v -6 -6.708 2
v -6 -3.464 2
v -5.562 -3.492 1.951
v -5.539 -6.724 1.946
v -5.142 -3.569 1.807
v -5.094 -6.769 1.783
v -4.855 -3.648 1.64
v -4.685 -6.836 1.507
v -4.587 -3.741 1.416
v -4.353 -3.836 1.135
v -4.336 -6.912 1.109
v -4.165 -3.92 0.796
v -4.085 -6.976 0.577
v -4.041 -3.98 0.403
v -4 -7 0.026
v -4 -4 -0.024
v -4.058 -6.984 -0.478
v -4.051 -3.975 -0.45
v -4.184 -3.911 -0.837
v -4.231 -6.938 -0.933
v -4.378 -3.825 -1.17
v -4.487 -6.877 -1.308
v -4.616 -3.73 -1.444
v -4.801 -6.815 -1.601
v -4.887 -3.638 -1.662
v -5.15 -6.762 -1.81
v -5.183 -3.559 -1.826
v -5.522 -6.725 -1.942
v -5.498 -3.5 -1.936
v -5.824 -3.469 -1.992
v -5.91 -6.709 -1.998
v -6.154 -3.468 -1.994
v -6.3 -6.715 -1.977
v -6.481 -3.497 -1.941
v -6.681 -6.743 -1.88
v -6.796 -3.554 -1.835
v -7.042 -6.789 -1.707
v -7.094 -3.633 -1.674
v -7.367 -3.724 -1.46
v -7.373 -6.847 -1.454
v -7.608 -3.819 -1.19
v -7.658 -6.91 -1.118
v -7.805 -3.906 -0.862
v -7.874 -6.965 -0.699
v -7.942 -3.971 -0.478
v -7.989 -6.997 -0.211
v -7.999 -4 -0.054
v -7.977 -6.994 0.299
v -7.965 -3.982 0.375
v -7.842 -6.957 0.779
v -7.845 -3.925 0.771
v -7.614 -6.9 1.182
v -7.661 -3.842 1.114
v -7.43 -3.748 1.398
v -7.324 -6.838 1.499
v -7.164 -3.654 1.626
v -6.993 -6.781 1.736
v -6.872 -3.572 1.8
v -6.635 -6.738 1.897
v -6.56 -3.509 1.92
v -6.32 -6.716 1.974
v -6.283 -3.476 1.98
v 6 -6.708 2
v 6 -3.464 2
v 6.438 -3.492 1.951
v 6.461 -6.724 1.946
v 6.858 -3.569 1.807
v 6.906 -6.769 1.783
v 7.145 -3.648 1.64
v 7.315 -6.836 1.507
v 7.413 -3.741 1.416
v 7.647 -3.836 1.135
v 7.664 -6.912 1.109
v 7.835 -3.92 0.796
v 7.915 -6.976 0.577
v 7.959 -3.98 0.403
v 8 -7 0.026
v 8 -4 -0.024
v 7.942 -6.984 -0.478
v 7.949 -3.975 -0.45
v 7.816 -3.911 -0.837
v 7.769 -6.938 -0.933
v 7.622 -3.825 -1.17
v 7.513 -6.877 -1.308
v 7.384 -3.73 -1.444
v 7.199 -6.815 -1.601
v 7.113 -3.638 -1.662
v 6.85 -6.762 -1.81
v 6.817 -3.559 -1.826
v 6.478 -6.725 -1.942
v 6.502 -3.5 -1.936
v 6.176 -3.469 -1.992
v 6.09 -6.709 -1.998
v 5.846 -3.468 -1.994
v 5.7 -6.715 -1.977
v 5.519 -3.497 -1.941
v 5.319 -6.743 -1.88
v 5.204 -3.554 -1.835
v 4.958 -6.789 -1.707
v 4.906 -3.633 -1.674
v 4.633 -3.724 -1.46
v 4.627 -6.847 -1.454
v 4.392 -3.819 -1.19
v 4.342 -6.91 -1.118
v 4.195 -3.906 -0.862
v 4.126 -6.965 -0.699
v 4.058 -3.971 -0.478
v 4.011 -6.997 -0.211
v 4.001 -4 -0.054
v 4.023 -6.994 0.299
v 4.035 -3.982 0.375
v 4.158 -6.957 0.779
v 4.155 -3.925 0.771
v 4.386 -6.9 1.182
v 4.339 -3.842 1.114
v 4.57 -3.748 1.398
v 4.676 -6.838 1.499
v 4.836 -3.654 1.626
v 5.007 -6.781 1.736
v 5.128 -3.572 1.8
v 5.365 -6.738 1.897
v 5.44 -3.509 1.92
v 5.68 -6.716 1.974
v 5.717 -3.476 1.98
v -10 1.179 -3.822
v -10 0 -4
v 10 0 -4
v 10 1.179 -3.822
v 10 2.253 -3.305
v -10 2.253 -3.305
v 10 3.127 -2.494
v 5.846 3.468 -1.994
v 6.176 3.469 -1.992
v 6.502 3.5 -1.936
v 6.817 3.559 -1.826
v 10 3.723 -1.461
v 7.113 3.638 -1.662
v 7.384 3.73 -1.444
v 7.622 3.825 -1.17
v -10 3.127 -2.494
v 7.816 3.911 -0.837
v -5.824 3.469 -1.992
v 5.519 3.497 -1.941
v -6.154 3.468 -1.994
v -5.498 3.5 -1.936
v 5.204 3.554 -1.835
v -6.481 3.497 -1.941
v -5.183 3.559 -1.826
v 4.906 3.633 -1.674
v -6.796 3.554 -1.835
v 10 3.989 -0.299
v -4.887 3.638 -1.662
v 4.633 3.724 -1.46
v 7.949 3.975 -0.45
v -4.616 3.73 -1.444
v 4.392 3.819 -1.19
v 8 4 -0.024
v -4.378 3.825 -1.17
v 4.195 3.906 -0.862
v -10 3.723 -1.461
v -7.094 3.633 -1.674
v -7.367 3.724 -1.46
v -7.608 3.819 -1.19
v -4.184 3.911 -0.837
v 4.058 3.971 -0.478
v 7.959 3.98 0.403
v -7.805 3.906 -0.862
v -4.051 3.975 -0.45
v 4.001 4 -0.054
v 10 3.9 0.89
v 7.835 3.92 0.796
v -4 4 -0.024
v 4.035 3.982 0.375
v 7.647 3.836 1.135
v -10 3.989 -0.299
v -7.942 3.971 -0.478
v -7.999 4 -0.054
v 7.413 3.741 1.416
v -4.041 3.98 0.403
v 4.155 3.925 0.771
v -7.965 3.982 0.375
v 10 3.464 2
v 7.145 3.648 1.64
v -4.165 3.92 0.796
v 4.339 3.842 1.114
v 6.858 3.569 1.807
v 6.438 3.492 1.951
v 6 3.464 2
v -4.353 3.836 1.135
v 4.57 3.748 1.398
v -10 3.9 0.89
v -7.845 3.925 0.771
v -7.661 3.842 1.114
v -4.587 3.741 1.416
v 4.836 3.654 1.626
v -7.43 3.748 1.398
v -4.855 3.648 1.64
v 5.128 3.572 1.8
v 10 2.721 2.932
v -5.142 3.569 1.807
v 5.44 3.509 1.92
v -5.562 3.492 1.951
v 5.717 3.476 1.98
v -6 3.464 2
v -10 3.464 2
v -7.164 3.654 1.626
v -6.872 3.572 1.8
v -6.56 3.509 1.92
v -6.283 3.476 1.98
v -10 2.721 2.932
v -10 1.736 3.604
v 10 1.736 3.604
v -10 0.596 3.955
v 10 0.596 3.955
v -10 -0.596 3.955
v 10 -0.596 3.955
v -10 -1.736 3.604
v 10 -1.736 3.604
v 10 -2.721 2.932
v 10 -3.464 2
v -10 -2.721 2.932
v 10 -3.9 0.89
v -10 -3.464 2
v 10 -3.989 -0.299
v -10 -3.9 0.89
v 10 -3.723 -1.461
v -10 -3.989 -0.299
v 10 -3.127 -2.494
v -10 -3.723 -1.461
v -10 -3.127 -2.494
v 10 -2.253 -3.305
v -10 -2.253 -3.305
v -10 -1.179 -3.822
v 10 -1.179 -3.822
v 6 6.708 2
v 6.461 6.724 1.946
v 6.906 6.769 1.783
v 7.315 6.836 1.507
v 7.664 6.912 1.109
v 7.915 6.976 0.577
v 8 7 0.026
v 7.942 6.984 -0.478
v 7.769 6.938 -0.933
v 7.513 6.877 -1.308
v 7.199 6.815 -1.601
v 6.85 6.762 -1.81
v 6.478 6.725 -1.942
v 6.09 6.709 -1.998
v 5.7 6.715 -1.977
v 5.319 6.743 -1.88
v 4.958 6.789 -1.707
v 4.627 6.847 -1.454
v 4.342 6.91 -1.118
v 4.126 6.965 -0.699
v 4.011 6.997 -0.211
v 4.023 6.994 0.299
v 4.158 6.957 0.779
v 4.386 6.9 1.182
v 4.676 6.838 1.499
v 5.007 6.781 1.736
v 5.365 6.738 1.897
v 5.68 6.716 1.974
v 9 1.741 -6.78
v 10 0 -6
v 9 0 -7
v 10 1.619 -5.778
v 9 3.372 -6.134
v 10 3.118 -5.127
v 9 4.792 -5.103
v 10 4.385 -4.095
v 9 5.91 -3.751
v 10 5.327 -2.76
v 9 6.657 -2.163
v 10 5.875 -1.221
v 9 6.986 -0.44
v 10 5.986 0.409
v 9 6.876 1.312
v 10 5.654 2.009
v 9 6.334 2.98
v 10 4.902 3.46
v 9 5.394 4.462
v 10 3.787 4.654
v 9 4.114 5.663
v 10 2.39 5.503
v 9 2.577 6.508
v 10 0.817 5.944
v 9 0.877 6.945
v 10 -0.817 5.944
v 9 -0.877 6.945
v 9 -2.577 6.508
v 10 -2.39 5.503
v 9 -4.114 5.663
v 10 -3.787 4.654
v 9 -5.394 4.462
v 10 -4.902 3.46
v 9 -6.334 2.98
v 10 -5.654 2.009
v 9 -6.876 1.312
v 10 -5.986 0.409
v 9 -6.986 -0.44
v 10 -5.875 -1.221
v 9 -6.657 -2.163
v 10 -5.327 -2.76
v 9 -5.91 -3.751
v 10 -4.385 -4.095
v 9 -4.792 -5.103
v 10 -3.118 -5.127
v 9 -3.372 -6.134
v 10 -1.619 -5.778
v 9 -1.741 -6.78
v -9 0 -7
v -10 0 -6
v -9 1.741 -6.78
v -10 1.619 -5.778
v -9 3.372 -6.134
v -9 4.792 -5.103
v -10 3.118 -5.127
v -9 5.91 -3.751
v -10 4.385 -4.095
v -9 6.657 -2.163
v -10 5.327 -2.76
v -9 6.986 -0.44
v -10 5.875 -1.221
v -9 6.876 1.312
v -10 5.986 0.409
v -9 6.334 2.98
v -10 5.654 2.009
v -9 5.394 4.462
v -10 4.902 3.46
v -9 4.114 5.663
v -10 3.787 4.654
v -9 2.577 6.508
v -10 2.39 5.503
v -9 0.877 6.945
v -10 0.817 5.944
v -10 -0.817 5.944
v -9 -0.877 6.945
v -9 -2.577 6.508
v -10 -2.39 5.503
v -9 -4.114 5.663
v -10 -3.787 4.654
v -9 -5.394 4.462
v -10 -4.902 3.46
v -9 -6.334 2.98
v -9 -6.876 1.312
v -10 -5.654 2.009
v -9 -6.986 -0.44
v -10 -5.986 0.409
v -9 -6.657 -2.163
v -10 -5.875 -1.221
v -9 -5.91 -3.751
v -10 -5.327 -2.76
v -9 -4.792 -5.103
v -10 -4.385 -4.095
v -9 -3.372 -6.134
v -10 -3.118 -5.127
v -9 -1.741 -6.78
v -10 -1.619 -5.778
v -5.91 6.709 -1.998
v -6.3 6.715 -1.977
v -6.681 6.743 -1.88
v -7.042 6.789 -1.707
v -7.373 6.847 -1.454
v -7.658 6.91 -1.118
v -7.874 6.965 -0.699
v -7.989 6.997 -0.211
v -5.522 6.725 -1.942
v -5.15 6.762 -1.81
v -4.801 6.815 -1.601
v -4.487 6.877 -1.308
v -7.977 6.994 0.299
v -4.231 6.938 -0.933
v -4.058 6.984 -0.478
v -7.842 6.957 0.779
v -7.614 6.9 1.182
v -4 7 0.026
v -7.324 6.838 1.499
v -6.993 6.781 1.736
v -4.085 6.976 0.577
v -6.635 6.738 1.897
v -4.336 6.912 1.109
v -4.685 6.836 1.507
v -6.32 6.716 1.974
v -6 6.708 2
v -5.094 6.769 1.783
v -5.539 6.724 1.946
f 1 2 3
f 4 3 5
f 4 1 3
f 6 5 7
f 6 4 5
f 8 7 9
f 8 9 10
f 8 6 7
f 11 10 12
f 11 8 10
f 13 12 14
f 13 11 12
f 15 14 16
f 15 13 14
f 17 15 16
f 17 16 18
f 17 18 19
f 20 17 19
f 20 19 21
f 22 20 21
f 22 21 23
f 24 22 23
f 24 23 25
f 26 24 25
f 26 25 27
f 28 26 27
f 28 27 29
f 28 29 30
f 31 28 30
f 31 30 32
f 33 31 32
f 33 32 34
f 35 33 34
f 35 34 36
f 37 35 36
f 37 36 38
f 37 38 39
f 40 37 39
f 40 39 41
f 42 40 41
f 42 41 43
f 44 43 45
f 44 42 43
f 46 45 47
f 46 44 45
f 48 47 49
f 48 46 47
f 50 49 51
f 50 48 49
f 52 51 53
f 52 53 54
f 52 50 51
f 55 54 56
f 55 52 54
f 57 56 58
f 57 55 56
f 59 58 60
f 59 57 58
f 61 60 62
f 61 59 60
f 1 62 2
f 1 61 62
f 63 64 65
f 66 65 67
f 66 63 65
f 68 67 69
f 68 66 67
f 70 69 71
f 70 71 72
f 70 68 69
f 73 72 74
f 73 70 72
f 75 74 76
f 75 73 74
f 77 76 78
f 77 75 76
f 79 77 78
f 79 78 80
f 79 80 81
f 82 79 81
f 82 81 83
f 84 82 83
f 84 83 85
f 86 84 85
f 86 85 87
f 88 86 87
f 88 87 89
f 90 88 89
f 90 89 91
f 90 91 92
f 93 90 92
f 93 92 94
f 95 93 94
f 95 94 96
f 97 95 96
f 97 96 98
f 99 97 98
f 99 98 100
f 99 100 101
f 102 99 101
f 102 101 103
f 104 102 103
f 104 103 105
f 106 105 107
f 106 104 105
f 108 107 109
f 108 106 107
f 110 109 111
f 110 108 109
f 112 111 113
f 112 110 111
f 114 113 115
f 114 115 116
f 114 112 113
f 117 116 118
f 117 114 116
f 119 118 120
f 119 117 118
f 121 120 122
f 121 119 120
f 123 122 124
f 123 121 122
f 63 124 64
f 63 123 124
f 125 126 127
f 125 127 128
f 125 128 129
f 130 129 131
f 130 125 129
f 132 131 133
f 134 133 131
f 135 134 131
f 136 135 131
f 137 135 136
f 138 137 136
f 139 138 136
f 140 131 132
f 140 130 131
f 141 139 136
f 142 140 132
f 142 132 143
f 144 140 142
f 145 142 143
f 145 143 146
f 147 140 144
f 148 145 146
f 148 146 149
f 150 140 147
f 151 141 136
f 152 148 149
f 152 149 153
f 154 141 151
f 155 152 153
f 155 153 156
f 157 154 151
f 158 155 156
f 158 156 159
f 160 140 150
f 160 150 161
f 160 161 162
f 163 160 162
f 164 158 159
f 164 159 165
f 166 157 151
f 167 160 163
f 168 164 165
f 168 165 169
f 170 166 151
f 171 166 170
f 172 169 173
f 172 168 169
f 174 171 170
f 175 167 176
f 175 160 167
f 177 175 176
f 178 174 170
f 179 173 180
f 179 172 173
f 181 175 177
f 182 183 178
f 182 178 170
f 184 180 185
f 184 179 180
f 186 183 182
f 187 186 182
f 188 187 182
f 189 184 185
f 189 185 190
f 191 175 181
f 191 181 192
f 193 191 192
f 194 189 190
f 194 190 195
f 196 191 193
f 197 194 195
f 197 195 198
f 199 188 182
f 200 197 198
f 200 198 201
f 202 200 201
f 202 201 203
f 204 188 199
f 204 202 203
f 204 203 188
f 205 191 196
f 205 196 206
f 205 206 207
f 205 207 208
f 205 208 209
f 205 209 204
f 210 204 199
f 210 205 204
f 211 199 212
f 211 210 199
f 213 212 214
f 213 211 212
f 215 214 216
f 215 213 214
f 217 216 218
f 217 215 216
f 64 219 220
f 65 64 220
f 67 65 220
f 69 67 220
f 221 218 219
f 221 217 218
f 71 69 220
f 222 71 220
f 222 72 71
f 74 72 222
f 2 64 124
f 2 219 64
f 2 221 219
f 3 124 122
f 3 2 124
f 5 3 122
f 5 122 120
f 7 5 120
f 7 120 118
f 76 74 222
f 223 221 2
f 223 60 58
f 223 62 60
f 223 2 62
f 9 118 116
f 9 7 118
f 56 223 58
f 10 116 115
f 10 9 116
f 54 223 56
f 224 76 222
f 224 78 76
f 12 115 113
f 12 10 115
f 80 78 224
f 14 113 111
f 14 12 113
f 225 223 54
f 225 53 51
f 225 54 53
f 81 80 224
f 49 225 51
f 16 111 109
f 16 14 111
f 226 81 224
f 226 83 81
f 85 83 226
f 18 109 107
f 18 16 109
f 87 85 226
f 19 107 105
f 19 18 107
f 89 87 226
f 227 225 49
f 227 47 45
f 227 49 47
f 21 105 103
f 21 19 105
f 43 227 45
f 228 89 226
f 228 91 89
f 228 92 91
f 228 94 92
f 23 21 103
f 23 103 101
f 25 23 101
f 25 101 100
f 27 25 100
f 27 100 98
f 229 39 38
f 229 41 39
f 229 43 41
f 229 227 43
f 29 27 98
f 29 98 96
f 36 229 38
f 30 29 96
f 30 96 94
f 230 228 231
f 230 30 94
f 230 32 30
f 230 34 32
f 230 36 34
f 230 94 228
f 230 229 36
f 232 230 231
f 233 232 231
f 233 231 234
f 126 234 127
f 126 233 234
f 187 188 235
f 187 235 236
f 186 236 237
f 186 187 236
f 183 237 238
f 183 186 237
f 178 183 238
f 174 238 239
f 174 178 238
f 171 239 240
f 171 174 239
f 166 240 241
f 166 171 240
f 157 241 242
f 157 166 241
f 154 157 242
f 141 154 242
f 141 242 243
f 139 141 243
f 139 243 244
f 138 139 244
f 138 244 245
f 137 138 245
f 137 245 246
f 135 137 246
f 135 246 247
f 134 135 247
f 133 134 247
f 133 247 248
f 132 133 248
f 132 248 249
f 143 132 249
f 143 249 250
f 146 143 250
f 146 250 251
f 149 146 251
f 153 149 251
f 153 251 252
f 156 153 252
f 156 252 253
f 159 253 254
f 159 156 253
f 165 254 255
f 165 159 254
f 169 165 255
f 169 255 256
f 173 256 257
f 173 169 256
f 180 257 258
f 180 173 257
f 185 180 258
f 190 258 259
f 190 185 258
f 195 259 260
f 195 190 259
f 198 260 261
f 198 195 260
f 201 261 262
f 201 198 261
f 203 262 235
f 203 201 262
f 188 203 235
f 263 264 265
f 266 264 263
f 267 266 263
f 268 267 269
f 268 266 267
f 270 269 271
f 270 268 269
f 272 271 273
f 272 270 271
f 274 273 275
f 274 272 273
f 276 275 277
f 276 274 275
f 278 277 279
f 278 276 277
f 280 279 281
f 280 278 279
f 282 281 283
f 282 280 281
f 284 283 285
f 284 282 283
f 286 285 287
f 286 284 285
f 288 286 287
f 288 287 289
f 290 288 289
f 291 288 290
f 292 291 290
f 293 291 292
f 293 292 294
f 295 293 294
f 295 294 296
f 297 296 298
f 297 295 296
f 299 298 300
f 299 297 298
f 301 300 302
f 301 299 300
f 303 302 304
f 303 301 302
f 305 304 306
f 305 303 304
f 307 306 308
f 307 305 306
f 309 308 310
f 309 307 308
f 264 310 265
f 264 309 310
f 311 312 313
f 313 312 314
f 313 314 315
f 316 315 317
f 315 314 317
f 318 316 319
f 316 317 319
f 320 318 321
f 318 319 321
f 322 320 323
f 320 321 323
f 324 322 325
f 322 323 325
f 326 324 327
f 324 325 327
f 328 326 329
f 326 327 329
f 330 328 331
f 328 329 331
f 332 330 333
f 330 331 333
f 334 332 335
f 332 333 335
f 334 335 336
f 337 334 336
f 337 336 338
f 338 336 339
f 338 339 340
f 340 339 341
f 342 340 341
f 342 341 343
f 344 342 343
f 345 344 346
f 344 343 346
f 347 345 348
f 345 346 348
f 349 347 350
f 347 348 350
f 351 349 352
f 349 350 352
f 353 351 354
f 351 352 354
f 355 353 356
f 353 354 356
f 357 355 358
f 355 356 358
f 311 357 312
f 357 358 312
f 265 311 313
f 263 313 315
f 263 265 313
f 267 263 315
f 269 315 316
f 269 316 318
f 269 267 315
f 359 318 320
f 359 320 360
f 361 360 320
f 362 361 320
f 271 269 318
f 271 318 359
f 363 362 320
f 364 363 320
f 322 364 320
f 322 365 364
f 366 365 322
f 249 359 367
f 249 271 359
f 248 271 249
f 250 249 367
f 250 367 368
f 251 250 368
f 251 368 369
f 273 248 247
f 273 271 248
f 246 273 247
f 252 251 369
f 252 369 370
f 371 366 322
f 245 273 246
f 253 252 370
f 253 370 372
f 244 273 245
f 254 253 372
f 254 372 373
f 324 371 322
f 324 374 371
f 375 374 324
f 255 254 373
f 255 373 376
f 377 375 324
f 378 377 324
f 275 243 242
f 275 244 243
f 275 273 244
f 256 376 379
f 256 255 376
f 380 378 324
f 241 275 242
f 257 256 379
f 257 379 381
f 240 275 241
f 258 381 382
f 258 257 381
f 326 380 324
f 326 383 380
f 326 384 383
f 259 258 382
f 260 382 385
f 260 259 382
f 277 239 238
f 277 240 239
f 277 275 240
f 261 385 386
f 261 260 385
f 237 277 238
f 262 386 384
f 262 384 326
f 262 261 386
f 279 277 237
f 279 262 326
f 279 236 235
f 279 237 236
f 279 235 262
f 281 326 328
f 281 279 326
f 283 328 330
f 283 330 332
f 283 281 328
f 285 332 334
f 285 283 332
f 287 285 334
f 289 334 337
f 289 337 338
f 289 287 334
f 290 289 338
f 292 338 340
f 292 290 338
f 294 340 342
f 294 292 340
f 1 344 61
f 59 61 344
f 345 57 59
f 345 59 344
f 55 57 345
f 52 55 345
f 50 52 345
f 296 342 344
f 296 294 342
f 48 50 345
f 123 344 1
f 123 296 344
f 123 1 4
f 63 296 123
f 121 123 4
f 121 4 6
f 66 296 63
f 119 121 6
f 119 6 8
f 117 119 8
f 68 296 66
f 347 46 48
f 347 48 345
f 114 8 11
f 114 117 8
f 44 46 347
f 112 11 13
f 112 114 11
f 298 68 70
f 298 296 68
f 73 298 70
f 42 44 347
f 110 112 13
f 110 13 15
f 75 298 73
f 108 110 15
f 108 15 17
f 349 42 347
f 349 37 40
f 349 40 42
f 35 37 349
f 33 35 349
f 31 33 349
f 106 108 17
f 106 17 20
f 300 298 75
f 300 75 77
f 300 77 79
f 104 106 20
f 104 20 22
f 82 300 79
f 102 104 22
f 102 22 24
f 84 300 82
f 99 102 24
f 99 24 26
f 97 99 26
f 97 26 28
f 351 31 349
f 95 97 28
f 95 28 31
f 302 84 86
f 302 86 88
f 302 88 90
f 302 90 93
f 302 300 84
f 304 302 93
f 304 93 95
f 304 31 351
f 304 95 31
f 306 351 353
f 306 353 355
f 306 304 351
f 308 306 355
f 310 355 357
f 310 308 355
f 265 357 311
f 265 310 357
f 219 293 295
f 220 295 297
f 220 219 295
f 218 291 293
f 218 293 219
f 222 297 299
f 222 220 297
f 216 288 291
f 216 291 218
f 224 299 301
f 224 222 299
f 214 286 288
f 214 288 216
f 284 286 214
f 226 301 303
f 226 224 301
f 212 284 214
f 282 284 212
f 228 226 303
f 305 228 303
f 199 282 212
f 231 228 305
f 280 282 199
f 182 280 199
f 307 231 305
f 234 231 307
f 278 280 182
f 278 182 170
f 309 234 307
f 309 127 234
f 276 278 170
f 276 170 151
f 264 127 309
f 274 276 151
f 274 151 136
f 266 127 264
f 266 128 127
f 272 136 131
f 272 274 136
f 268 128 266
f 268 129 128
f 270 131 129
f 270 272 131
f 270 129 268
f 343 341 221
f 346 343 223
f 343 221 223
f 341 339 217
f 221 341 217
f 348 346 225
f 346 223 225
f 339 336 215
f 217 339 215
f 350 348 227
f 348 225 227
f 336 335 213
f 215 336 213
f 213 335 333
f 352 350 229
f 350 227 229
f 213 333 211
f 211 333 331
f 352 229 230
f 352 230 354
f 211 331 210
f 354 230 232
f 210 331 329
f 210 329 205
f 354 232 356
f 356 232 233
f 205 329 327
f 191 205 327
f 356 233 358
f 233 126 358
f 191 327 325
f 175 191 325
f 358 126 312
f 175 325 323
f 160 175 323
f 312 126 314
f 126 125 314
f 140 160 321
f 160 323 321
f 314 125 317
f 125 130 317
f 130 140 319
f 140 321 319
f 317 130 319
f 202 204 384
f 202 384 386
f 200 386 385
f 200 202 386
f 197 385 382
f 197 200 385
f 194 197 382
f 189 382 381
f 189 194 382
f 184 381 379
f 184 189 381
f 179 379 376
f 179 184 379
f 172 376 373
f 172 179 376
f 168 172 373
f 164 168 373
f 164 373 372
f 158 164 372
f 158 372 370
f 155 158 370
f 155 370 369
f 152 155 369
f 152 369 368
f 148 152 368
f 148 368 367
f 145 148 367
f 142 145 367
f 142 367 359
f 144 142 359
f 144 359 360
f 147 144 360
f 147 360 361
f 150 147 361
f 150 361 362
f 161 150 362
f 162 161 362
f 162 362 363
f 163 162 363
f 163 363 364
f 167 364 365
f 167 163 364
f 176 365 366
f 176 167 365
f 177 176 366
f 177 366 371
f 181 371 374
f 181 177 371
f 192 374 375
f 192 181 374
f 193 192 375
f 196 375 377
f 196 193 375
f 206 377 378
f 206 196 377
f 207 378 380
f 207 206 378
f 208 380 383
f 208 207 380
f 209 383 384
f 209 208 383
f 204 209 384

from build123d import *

# Parameters (mm, degrees)
SKETCH1_R               = 7
SKETCH1_R_2             = 4
BOSS_EXTRUDE1_DEPTH     = 10
CUT_EXTRUDE1_DEPTH      = 15.071247279
CUT_EXTRUDE1_DEPTH_BACK = 15.071247279
SKETCH2_R               = 2
CHAMFER1_SIZE           = 1


with BuildPart() as part:
    # Sketch1 → Boss-Extrude1 (new, symmetric)
    with BuildSketch(Plane(origin=(0, 0, 0), x_dir=(0, 0, -1), z_dir=(1, 0, 0))):
        Circle(SKETCH1_R)
        Circle(SKETCH1_R_2, mode=Mode.SUBTRACT)
    extrude(amount=BOSS_EXTRUDE1_DEPTH, both=True)

    # Sketch2 → Cut-Extrude1 (cut, two sides: drawn at the far end of the back side and taken through both)
    with BuildSketch(Plane(origin=(0, 0, 0), x_dir=(1, 0, 0), z_dir=(0, 1, 0)).offset(-CUT_EXTRUDE1_DEPTH_BACK)):
        with Locations(Location((-6, 0, 0), (0, 0, 270))):
            Circle(SKETCH2_R)
        with Locations(Location((6, 0, 0), (0, 0, 270))):
            Circle(SKETCH2_R)
    extrude(amount=CUT_EXTRUDE1_DEPTH + CUT_EXTRUDE1_DEPTH_BACK, mode=Mode.SUBTRACT)

    # Chamfer1
    chamfer1_edges = [part.edges().sort_by_distance(p)[0] for p in [
        (-10, 0, 7),
        (10, 0, 7),
    ]]
    chamfer(chamfer1_edges, length=CHAMFER1_SIZE)


solid = part.part
